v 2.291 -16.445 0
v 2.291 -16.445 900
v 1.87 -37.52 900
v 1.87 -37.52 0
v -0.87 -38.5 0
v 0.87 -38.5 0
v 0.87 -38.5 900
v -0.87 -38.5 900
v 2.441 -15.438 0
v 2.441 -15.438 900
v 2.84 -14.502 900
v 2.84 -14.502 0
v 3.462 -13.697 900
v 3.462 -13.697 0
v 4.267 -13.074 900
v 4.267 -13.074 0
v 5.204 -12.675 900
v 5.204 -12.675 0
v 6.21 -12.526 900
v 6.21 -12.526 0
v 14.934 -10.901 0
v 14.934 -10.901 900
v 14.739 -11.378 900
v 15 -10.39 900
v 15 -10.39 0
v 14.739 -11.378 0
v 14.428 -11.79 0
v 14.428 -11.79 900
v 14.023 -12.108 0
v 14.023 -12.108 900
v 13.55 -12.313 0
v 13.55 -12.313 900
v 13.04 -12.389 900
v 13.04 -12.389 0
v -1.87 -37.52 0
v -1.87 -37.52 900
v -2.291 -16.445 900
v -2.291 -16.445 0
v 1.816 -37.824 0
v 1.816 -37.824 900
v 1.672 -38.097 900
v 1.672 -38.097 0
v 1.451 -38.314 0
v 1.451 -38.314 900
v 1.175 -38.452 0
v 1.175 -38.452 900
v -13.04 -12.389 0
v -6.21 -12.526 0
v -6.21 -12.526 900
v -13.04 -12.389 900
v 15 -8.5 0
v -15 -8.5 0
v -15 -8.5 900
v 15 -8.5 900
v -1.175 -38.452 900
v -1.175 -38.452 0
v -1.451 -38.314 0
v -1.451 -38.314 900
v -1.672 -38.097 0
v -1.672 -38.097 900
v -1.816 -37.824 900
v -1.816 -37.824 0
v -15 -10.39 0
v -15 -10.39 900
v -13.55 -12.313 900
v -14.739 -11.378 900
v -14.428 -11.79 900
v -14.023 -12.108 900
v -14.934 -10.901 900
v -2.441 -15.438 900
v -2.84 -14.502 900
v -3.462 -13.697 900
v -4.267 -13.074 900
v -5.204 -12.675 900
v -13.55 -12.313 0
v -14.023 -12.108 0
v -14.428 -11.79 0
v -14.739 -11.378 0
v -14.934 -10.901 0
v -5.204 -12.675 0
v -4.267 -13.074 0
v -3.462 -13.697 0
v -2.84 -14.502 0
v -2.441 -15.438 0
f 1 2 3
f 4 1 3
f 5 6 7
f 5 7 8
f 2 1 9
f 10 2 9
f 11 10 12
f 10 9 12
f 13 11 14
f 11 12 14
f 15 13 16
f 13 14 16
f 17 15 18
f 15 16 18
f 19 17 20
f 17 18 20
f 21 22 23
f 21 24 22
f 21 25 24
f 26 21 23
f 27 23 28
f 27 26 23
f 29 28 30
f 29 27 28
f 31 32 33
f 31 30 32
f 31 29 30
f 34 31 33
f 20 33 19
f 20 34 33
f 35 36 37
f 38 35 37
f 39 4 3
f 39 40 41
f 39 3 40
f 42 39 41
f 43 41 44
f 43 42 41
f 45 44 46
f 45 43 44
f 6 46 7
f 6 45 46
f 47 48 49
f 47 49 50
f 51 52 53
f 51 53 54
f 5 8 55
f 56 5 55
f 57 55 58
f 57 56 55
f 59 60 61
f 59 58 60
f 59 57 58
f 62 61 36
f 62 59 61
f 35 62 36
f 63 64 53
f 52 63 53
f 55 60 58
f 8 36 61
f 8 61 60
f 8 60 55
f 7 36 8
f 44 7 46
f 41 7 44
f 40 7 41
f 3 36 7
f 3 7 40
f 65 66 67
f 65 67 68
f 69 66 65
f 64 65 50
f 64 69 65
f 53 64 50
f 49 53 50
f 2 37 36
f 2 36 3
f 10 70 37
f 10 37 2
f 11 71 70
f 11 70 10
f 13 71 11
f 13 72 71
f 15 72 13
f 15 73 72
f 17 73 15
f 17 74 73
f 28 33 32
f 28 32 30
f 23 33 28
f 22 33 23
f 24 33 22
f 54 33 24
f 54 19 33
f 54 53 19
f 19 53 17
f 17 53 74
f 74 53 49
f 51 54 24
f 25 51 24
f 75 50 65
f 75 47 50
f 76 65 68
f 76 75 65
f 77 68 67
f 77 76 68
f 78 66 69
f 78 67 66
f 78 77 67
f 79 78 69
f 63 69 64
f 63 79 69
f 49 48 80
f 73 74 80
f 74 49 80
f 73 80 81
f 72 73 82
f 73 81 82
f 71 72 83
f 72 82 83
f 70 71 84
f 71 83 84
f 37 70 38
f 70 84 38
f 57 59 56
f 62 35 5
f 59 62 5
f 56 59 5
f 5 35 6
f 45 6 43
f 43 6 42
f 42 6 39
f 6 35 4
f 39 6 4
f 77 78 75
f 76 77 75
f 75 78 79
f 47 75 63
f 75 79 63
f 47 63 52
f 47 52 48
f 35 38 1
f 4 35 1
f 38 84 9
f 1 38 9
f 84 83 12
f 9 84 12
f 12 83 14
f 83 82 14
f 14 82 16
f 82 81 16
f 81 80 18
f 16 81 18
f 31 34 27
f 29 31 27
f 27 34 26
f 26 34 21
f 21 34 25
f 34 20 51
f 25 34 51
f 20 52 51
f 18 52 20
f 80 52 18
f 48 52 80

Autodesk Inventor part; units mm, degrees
ref_plane "YZ Plane" through (0, 0, 0) normal (1, 0, 0) x (0, 1, 0)
ref_plane "Start plane" through (0, 0, 0) normal (0, 0, 1) x (1, 0, 0)
ref_plane "End plane" through (0, 0, 900) normal (0, 0, 1) x (1, 0, 0)
sketch "Sketch" plane through (0, 0, 0) normal (0, 0, 1) x (1, 0, 0)
  line L0 (0.8698, -38.5) -> (-0.8698, -38.5)
  line L1 (2.2911, -16.445) -> (1.8696, -37.52)
  line L2 (13.04, -12.3892) -> (6.2103, -12.5258)
  line L3 (15, -8.5) -> (15, -10.3896)
  line L4 (-15, -10.3896) -> (-15, -8.5)
  line L5 (-6.2103, -12.5258) -> (-13.04, -12.3892)
  line L6 (-1.8696, -37.52) -> (-2.2911, -16.445)
  line L7 (-2.3679, -12.6026) -> (2.3679, -12.6026) construction
  line L8 (0, -46.445) -> (0, 7.7408) construction
  arc A0 (-2.2911, -16.445) -> (-6.2103, -12.5258) centre (-6.2903, -16.525) ccw
  arc A1 (6.2103, -12.5258) -> (2.2911, -16.445) centre (6.2903, -16.525) ccw
  arc A2 (-15, -10.3896) -> (-13.04, -12.3892) centre (-13, -10.3896) ccw
  arc A3 (13.04, -12.3892) -> (15, -10.3896) centre (13, -10.3896) ccw
  arc A4 (-1.8696, -37.52) -> (-0.8698, -38.5) centre (-0.8698, -37.5) ccw
  arc A5 (0.8698, -38.5) -> (1.8696, -37.52) centre (0.8698, -37.5) ccw
  line L9 (-21.5716, 0) -> (21.5716, 0) construction
  line L10 (-15, -8.5) -> (15, -8.5)
  point P0 (1.85, -38.5)
  point P1 (-1.85, -38.5)
  point P2 (15, -12.35)
  point P3 (-15, -12.35)
  point P4 (0, 0)
  point P5 (0, -12.6026)
  dimension "d9" = 3.85
  dimension "d11" = 3.85
  dimension "d23" = 3.7
  dimension "d26" = 1.146
  dimension "d27" = 1.146
  dimension "d28" = 4
  dimension "d29" = 2
  dimension "d30" = 1
  dimension "d31" = 30
  dimension "d32" = 1.146
  dimension "d33" = 30
  dimension "d34" = 8.5
extrude "Body" add sketch "Sketch" along normal up to surface (900 mm away) from surface at 0
sketch "Sketch3" plane through (0, 0, 0) normal (0, 0, 1) x (1, 0, 0)
  line L0 (0, 0) -> (10, 0)
ref_plane "Work Plane6" through (0, 0, 0) normal (0, -1, 0) x (1, 0, 0)
sketch "Sketch4" plane through (0, 0, 0) normal (0, -1, 0) x (1, 0, 0)
  line L0 (-2, 0) -> (12, 0)
  line L1 (-2, 900) -> (12, 900)
  dimension "d38" = 900
equation "\"d9\" = -msp_pom3 + ParT"
equation "\"d11\" = -msp_pom3 + ParT"
equation "\"d23\" = ParT - msp_pom2"
equation "\"d26\" = d27"
equation "\"d27\" = d32"
equation "\"d28\" = R"
equation "\"d29\" = R1"
equation "\"d30\" = R2"
equation "\"d31\" = ParH"
equation "\"d32\" = msp_ang"
equation "\"d33\" = b"
equation "\"d34\" = ex"
equation "\"d13\" = G_L"
equation "\"b\" = 30"
equation "\"ParH\" = 30"
equation "\"R\" = 4"
equation "\"ParT\" = 4"
equation "\"R1\" = 2"
equation "\"R2\" = 1"
equation "\"G_L\" = d38"
equation "\"msp_x1\" = 0"
equation "\"msp_x2\" = 0"
equation "\"msp_x\" = 0"
equation "\"msp_ang\" = 1.14576deg"
equation "\"ex\" = 8.5"
equation "\"G_OFFSET_START\" = 0"
equation "\"G_OFFSET_END\" = 0"
equation "\"msp_pom3\" = 0.15"
equation "\"msp_pom2\" = 0.3"
properties part number "DIN 1024 - T30-900" material "Steel, Mild"
